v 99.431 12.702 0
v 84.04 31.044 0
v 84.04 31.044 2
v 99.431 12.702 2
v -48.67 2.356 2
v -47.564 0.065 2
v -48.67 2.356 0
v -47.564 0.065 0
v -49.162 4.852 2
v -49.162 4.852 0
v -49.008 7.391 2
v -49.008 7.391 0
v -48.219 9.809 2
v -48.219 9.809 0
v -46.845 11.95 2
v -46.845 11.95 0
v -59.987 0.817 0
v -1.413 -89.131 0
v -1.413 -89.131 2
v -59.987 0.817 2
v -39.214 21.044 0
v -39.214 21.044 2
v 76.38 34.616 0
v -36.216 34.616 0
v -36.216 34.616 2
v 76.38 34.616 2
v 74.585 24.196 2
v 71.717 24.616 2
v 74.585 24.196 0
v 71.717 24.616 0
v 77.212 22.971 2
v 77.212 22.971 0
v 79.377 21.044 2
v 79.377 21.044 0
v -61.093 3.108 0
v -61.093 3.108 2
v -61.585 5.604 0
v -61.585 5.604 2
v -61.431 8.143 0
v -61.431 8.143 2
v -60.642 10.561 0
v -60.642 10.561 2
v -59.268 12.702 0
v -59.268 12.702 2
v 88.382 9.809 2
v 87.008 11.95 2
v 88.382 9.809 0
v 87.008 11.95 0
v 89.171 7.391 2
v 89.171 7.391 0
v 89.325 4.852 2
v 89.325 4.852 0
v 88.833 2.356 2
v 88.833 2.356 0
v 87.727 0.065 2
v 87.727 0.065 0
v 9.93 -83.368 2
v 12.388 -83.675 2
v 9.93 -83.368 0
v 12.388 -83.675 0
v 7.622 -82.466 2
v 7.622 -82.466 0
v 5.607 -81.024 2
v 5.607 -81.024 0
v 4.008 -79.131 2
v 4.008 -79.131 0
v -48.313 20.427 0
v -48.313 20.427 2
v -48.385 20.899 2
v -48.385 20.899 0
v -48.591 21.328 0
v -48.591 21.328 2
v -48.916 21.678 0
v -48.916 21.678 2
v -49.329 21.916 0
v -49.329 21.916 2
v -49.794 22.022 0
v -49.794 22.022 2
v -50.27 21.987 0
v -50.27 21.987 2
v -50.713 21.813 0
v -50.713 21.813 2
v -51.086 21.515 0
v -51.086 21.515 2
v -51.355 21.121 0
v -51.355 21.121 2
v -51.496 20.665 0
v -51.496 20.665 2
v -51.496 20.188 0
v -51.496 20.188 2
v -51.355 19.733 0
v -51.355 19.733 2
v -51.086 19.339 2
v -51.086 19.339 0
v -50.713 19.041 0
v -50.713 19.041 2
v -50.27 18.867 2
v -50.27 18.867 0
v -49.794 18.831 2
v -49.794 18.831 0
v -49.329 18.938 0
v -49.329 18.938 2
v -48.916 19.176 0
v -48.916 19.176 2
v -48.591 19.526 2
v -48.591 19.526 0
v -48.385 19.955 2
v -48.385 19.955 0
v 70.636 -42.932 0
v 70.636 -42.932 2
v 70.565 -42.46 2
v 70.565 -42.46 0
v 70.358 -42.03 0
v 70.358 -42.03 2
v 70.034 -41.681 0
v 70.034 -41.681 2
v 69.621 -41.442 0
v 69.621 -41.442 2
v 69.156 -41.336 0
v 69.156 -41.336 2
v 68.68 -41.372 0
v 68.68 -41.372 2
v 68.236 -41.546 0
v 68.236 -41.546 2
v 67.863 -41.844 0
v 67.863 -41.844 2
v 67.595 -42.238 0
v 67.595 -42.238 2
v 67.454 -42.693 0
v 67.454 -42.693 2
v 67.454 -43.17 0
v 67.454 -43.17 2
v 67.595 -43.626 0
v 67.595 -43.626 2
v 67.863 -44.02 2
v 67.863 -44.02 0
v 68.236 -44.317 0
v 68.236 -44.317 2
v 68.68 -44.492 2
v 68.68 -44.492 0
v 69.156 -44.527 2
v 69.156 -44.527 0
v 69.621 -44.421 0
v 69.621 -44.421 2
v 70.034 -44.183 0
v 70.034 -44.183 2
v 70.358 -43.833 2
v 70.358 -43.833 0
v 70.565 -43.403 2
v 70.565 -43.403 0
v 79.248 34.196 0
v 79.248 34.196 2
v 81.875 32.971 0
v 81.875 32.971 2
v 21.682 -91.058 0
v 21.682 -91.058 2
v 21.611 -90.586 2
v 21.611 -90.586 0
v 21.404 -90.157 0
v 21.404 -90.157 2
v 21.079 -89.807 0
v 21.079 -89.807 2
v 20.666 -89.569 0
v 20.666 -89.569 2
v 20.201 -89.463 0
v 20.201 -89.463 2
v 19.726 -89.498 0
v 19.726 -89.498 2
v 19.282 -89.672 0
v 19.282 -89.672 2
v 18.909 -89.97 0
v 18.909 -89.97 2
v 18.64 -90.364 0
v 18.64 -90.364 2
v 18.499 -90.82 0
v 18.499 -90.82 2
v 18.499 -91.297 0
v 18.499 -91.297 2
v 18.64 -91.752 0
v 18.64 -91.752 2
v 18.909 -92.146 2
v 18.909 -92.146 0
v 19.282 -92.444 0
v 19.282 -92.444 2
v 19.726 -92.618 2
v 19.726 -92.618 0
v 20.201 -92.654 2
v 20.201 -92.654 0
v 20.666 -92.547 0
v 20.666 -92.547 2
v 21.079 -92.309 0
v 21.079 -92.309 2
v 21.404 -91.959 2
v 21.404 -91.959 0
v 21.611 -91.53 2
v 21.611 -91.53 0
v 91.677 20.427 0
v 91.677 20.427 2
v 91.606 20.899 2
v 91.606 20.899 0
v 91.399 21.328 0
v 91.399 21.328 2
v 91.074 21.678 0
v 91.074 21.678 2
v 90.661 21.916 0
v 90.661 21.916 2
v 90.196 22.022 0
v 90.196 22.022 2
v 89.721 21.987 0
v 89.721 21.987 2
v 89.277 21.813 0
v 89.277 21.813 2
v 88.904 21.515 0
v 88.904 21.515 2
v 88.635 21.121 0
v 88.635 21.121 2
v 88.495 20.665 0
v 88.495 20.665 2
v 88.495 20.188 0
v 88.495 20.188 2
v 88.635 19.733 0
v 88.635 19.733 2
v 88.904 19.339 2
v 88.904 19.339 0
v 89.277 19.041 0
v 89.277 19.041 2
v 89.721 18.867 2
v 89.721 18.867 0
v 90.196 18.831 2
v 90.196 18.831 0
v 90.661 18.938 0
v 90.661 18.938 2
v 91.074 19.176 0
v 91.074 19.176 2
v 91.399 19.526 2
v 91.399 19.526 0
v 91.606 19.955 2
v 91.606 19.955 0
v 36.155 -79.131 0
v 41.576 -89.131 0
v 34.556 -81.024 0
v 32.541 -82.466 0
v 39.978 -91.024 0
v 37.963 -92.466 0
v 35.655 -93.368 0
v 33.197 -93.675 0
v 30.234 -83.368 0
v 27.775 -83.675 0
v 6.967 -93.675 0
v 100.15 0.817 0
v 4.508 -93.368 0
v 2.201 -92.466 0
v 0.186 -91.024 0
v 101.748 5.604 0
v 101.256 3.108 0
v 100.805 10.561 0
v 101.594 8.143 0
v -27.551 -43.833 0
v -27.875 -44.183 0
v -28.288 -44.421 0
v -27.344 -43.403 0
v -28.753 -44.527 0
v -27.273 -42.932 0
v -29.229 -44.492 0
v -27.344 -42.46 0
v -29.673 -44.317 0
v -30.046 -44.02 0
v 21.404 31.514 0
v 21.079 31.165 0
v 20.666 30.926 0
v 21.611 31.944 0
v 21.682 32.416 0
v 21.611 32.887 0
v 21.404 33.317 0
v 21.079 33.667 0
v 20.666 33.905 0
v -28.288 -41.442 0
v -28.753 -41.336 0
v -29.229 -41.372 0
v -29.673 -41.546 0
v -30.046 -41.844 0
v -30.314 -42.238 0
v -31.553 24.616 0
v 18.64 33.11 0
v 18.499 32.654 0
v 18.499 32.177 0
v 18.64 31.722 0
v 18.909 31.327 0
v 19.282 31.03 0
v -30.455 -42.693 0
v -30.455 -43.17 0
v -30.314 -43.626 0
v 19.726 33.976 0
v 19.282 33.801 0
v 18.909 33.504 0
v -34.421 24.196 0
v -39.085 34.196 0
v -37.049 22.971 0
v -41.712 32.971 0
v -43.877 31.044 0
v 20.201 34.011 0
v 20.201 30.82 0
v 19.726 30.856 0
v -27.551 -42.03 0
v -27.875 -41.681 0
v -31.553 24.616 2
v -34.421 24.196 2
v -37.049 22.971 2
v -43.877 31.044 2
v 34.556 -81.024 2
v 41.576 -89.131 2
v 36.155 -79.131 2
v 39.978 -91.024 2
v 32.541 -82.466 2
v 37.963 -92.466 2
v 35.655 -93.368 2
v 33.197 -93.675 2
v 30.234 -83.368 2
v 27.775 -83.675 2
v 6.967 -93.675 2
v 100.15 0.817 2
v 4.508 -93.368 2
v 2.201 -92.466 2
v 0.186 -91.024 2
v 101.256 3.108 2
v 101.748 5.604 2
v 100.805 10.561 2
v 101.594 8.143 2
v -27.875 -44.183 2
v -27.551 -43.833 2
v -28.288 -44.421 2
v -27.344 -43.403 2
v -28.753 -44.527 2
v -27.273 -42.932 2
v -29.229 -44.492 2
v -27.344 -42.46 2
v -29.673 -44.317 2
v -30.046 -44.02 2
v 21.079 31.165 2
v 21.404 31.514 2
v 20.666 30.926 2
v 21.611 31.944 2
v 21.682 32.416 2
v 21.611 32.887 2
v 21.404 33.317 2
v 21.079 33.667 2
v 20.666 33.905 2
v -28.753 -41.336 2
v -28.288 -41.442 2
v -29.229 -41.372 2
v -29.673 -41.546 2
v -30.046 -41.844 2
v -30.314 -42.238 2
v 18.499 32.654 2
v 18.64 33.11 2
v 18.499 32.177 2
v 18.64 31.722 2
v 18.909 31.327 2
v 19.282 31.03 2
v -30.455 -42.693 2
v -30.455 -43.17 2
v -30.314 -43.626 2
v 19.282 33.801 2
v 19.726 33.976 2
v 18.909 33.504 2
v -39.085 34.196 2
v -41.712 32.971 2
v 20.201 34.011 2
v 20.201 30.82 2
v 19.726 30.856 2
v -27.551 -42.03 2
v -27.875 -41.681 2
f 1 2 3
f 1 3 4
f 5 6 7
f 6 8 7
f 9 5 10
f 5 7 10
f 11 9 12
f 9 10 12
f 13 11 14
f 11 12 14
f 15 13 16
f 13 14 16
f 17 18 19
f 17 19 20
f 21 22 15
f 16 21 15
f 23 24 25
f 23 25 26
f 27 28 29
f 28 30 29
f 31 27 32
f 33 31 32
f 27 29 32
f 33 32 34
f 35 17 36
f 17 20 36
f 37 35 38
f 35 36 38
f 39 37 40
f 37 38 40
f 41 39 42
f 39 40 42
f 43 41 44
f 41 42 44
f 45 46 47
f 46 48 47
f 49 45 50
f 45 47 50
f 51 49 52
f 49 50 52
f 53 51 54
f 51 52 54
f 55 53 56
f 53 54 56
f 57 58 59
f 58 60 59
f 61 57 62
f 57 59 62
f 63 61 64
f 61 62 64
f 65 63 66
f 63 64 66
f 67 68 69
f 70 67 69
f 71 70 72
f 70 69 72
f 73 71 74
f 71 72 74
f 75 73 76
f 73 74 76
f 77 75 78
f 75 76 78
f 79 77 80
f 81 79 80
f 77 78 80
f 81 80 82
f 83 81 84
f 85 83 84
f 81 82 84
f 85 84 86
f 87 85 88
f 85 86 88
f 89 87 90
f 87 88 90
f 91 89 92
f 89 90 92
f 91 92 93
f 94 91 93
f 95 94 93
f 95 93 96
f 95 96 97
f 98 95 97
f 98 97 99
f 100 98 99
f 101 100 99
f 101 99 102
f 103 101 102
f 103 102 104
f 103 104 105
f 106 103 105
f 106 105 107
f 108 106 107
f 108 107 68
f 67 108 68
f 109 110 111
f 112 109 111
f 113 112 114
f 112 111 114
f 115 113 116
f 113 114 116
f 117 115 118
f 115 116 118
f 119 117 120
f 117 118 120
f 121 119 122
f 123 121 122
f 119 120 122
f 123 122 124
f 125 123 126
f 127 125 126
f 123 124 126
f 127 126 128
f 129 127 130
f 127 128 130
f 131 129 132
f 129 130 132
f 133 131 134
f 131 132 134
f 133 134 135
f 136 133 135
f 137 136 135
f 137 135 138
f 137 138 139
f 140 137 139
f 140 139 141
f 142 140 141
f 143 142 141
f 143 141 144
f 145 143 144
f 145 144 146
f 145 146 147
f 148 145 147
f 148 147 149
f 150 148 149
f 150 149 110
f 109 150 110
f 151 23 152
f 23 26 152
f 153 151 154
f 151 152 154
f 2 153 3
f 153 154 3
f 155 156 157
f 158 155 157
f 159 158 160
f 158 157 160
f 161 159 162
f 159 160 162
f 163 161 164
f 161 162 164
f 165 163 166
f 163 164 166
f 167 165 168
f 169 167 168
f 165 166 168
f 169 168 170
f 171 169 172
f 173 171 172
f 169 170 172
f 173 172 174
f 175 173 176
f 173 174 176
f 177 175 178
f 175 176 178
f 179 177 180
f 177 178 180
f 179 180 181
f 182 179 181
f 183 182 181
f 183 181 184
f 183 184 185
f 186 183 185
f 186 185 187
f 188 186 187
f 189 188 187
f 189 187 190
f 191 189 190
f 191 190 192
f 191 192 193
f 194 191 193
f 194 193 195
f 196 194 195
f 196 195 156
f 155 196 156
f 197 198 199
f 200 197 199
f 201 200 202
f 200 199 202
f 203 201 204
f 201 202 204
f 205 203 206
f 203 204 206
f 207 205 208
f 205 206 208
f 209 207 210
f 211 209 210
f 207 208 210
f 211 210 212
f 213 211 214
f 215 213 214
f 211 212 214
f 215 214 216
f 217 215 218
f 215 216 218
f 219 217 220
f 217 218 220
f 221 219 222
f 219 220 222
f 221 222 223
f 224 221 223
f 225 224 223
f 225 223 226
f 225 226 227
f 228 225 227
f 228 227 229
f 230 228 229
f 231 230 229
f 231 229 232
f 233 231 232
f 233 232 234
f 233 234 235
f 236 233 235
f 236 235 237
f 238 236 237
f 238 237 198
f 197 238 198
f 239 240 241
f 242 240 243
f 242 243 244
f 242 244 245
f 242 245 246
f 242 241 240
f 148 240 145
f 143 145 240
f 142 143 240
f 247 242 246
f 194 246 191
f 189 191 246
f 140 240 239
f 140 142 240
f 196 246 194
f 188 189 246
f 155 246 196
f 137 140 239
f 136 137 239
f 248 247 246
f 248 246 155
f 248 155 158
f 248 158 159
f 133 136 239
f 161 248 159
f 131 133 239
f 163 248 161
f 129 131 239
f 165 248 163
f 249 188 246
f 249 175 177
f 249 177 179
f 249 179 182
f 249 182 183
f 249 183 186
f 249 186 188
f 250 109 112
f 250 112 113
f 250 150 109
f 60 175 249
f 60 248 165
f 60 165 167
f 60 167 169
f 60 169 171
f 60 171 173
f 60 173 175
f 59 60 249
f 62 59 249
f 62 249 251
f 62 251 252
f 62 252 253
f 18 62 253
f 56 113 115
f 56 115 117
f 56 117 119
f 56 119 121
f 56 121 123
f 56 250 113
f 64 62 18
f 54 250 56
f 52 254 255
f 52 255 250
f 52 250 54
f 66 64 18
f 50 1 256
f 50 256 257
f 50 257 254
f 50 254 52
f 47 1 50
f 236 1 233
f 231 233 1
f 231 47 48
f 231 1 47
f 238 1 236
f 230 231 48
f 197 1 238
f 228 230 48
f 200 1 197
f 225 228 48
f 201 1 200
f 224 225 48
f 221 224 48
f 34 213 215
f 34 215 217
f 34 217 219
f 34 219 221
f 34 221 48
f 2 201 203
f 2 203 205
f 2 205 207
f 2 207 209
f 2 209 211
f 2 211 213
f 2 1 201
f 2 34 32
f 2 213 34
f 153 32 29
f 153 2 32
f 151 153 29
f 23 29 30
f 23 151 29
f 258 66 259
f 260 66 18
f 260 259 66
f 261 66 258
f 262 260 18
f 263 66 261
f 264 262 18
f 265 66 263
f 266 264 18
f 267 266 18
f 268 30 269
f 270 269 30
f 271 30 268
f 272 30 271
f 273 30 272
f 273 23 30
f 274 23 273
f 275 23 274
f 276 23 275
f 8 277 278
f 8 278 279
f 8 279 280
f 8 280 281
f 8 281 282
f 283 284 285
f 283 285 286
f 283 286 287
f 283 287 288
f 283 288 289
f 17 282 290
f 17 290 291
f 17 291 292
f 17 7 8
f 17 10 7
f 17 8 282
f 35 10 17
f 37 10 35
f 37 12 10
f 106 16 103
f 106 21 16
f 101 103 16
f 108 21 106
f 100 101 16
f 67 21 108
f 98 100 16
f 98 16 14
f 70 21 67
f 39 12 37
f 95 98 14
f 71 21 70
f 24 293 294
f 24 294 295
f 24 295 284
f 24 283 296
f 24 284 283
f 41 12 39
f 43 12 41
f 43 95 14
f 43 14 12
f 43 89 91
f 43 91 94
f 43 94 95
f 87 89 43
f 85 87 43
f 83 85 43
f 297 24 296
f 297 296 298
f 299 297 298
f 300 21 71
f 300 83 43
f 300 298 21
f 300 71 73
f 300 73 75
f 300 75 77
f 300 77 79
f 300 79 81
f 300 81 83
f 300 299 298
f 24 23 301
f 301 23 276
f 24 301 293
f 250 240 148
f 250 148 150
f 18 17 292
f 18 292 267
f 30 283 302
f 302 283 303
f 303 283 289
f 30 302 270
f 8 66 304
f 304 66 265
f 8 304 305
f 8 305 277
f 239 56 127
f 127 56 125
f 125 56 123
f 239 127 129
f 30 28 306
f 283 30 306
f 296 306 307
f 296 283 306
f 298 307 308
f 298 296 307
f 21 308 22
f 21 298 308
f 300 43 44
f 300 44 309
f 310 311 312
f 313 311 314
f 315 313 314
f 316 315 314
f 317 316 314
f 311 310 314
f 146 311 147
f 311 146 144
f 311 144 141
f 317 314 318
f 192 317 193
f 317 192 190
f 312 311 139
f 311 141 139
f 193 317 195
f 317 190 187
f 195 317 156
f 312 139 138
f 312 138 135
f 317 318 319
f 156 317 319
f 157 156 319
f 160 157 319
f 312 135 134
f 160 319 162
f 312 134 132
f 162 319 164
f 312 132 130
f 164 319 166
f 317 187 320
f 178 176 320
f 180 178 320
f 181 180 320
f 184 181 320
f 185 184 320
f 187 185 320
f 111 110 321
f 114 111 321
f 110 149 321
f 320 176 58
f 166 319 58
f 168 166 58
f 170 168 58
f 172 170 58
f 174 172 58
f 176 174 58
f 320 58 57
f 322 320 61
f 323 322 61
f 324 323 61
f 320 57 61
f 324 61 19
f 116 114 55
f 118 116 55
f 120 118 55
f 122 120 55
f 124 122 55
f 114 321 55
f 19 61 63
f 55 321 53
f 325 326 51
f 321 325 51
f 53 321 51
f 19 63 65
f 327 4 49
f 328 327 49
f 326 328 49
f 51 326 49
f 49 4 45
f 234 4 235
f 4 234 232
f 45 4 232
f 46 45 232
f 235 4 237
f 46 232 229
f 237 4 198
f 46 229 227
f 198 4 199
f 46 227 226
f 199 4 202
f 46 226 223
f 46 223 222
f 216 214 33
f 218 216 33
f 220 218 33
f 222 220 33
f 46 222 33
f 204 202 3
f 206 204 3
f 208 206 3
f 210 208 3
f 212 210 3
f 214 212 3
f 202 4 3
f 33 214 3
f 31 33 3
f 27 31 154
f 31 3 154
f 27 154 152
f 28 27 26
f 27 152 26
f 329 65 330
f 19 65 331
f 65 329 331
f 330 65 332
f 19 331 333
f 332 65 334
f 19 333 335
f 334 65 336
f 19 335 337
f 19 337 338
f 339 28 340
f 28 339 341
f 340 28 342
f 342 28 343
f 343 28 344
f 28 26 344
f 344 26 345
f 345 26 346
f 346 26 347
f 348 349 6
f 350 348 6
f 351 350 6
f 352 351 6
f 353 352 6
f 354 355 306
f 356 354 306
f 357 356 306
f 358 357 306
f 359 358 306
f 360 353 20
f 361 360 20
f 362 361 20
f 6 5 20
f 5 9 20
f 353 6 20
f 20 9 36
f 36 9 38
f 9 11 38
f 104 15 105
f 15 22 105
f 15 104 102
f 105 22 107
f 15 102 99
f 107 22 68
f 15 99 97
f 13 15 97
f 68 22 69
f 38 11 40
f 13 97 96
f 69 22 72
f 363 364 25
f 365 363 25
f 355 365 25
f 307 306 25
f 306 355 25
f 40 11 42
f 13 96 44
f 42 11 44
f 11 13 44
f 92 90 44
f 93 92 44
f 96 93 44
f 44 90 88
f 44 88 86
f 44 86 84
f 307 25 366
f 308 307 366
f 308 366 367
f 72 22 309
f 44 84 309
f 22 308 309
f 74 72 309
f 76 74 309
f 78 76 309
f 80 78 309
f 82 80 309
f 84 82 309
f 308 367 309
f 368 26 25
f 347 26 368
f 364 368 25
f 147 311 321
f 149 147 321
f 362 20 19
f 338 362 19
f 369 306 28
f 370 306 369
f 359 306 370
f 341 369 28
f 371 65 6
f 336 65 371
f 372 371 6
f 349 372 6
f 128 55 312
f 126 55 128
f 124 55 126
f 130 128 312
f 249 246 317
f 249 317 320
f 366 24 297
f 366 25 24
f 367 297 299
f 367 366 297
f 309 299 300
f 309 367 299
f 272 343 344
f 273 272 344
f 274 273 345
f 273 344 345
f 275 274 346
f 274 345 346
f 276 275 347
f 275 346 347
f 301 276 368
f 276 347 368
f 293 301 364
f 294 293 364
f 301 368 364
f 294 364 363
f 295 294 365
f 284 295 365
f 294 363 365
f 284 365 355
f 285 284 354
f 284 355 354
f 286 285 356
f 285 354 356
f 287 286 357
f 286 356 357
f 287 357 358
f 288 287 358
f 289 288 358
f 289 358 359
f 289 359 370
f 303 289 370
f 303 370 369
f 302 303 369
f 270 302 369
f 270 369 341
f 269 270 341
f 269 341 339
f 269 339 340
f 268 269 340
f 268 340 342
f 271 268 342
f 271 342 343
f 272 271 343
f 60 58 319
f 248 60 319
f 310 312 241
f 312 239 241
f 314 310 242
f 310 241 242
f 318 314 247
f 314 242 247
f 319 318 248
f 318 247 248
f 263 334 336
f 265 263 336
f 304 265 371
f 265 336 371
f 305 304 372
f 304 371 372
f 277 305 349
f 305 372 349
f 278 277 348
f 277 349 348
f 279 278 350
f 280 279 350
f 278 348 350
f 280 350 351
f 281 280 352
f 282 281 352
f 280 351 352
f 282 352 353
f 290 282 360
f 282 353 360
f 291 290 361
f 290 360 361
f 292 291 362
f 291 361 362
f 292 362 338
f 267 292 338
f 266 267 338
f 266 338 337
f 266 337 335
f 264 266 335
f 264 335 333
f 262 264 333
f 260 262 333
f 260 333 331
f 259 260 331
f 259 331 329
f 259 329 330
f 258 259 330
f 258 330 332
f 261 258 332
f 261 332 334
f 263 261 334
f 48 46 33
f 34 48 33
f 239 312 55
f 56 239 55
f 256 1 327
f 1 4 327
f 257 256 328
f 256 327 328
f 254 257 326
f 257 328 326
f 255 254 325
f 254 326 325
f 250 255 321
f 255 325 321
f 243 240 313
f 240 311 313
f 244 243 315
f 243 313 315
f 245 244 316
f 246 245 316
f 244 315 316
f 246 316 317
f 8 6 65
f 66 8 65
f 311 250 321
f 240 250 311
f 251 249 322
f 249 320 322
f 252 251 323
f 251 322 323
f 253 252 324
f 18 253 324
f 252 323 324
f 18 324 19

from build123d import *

# Parameters (mm, degrees)
BOSS_EXTRU_1_DEPTH      = 2
CONG_1_R                = 10
ENL_V_MAT_EXTRU_1_DEPTH = 2
CONG_2_R                = 10
ESQUISSE3_R             = 1.6
ENL_V_MAT_EXTRU_2_DEPTH = 10


with BuildPart() as part:
    # Esquisse1 → Boss.-Extru.1 (new body)
    with BuildSketch(Plane.XY):
        Polygon((-40.879571388, 34.615718895), (81.042798068, 34.615718895), (104.193503713, 7.025782272), (38.617977526, -93.674532757), (1.545249154, -93.674532757), (-64.030277033, 7.025782272), align=None)
    extrude(amount=BOSS_EXTRU_1_DEPTH)

    # Congé1
    cong_1_edges = [part.edges().sort_by_distance(p)[0] for p in [
        (-40.879571388, 34.615718895, 1),
        (81.042798068, 34.615718895, 1),
        (104.193503713, 7.025782272, 1),
        (38.617977526, -93.674532757, 1),
        (1.545249154, -93.674532757, 1),
        (-64.030277033, 7.025782272, 1),
    ]]
    fillet(cong_1_edges, radius=CONG_1_R)

    # Esquisse2 → Enlèv. mat.-Extru.1 (cut)
    with BuildSketch(Plane.XY.offset(2)):
        Polygon((-36.216494806, 24.615718895), (-51.607204261, 6.27378561), (6.96667711, -83.674532757), (33.19654957, -83.674532757), (91.770430941, 6.27378561), (76.379721487, 24.615718895), align=None)
    extrude(amount=-ENL_V_MAT_EXTRU_1_DEPTH, mode=Mode.SUBTRACT)

    # Congé2
    cong_2_edges = [part.edges().sort_by_distance(p)[0] for p in [
        (-36.216494806, 24.615718895, 1),
        (76.379721487, 24.615718895, 1),
        (91.770430941, 6.27378561, 1),
        (33.19654957, -83.674532757, 1),
        (6.96667711, -83.674532757, 1),
        (-51.607204261, 6.27378561, 1),
    ]]
    fillet(cong_2_edges, radius=CONG_2_R)

    # Esquisse3 → Enlèv. mat.-Extru.2 (cut)
    with BuildSketch(Plane.XY.offset(2)):
        with Locations((20.08161334, -91.058073416)):
            Circle(ESQUISSE3_R)
        with Locations((-28.872824595, -42.931783887)):
            Circle(ESQUISSE3_R)
        with Locations((20.08161334, 32.415718895)):
            Circle(ESQUISSE3_R)
        with Locations((90.076701777, 20.426939275)):
            Circle(ESQUISSE3_R)
        with Locations((69.036051275, -42.931783887)):
            Circle(ESQUISSE3_R)
        with Locations((-49.913475097, 20.426939275)):
            Circle(ESQUISSE3_R)
    extrude(amount=-ENL_V_MAT_EXTRU_2_DEPTH, mode=Mode.SUBTRACT)


solid = part.part
